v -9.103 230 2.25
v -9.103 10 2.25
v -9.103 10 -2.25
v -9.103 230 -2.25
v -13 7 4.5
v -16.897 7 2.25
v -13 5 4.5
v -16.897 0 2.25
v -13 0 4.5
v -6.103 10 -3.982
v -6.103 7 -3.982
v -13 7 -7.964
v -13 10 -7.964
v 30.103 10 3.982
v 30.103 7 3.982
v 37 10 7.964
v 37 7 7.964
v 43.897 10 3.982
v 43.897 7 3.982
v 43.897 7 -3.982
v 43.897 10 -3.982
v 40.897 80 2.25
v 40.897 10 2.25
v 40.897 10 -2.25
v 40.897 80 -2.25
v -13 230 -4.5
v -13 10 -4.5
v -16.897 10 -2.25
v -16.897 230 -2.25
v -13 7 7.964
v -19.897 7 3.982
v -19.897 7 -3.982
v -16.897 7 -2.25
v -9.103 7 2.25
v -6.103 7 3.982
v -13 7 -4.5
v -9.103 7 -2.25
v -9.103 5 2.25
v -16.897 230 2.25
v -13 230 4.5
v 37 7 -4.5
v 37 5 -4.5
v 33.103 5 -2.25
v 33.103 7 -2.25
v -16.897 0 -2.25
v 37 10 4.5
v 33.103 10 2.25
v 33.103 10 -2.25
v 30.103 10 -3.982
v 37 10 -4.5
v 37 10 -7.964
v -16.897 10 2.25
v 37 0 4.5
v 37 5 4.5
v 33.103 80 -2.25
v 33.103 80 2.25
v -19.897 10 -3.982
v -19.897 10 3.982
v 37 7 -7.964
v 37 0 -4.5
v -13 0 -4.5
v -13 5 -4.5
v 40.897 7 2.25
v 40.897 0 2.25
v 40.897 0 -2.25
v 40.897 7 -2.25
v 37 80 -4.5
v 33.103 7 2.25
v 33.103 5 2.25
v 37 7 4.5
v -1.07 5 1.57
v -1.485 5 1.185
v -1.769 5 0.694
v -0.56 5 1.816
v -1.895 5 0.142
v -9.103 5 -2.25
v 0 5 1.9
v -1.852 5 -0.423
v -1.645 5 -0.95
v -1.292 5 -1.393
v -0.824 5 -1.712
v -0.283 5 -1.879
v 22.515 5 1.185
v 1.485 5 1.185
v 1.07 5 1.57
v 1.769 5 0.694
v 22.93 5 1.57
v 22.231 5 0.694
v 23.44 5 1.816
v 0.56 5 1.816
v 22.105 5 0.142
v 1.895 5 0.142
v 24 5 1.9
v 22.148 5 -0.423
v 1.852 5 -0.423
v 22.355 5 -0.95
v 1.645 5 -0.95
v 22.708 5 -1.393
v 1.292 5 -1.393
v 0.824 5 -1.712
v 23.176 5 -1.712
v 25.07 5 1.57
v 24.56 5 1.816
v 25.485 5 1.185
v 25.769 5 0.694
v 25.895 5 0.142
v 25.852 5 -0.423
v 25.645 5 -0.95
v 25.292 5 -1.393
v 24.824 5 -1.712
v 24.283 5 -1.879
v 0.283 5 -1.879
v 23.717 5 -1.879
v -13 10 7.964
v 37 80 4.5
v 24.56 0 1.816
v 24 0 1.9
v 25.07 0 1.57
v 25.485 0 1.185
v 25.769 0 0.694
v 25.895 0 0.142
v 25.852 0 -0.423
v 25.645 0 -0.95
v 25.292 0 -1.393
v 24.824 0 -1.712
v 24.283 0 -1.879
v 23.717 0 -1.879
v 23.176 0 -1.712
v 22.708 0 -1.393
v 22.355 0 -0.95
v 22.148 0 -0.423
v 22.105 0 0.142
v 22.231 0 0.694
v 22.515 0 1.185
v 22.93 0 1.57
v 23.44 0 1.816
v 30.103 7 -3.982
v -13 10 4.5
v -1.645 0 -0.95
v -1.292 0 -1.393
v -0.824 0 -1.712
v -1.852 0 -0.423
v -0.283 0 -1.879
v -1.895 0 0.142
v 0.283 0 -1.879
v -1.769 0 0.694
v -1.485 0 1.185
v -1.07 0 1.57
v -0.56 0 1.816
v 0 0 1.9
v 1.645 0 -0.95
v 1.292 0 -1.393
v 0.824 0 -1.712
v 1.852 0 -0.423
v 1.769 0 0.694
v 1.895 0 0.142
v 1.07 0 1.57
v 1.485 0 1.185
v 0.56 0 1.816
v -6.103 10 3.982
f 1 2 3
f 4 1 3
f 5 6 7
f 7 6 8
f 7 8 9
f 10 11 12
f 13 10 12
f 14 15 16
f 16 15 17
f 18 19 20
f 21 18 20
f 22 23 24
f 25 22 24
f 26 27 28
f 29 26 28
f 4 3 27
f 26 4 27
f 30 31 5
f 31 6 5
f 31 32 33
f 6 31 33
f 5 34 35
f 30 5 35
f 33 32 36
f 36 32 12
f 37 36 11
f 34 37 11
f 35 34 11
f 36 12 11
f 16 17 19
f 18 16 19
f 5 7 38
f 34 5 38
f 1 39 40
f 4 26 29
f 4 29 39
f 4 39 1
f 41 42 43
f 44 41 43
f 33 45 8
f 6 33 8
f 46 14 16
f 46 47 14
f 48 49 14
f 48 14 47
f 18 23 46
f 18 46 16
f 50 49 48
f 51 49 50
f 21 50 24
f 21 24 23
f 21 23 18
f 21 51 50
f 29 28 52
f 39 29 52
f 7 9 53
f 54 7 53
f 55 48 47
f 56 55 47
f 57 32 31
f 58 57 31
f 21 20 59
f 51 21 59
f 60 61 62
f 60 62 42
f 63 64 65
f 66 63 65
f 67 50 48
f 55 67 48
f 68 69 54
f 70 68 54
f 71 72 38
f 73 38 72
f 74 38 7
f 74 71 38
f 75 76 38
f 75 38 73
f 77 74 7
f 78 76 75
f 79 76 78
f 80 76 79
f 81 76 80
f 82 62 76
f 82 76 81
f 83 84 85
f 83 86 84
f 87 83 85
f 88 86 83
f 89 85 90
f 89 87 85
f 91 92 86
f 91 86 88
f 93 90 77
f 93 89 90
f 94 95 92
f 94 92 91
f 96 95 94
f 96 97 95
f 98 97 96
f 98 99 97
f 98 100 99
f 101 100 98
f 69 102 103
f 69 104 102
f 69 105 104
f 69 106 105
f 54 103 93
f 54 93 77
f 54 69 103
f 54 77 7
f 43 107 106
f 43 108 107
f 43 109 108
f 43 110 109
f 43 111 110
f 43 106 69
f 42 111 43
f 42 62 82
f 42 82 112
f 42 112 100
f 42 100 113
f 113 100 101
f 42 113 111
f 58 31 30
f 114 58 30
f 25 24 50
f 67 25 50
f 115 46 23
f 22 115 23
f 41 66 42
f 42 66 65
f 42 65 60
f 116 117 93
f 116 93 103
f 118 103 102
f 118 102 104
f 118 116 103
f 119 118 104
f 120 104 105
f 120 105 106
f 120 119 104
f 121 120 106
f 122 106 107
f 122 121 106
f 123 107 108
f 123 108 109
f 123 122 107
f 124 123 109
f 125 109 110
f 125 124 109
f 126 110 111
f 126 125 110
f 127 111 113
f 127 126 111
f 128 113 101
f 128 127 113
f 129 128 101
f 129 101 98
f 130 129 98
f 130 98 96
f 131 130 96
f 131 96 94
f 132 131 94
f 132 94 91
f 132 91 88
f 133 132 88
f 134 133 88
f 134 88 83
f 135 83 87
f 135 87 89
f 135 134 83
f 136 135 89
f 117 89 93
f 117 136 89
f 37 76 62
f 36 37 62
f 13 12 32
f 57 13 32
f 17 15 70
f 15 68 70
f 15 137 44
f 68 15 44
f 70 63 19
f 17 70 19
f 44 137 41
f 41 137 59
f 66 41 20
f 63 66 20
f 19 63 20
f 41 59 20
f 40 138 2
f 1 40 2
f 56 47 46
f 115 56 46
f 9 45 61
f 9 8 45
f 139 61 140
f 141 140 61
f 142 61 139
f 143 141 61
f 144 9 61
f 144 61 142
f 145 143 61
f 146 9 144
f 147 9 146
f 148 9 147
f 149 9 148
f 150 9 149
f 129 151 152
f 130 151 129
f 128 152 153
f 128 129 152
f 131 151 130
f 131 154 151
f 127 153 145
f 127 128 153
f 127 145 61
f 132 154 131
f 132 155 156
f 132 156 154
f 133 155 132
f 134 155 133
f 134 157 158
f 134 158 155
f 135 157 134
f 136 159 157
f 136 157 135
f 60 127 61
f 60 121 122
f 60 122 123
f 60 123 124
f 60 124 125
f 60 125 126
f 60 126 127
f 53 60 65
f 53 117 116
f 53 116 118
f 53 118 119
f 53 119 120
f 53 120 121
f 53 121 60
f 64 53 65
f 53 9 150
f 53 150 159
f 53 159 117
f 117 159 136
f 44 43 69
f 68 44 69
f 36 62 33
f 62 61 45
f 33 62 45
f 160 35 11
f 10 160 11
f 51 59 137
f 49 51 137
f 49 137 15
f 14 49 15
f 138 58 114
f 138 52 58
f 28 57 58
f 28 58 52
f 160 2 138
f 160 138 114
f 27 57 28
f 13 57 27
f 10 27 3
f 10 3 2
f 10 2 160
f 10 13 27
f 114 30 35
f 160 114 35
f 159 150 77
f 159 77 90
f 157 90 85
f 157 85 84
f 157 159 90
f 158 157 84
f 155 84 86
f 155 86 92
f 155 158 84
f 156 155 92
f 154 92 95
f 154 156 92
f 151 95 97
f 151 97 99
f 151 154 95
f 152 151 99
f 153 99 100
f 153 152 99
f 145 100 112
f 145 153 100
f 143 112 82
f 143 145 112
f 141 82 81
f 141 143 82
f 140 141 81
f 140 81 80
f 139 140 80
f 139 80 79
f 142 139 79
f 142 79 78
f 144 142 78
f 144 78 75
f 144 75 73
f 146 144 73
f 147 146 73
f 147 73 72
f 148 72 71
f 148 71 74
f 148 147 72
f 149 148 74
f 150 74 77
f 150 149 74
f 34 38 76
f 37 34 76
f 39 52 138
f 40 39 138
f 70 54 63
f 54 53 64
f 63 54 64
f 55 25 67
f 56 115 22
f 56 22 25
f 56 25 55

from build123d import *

# Parameters (mm, degrees)
SKETCH1_W           = 50
SKETCH1_H           = 9
SKETCH1_R           = 1.9
BOSS_EXTRUDE1_DEPTH = 5
BOSS_EXTRUDE2_DEPTH = 80
BOSS_EXTRUDE3_DEPTH = 150
BOSS_EXTRUDE4_DEPTH = 3


with BuildPart() as part:
    # Sketch1 → Boss-Extrude1 (new body)
    with BuildSketch(Plane(origin=(0, 0, 0), x_dir=(1, 0, 0), z_dir=(0, 1, 0))):
        with Locations((12, 0)):
            Rectangle(SKETCH1_W, SKETCH1_H)
        with Locations(Location((24, 0, 0), (0, 0, 270))):
            Circle(SKETCH1_R, mode=Mode.SUBTRACT)
        with Locations(Location((0, 0, 0), (0, 0, 270))):
            Circle(SKETCH1_R, mode=Mode.SUBTRACT)
    extrude(amount=BOSS_EXTRUDE1_DEPTH)

    # Sketch3 → Boss-Extrude2 (add)
    with BuildSketch(Plane.XZ):
        Polygon((-13, 4.5), (-16.897114317, 2.25), (-16.897114317, -2.25), (-13, -4.5), (-9.102885683, -2.25), (-9.102885683, 2.25), align=None)
        Polygon((33.102885683, 2.25), (37, 4.5), (40.897114317, 2.25), (40.897114317, -2.25), (37, -4.5), (33.102885683, -2.25), align=None)
    extrude(amount=-BOSS_EXTRUDE2_DEPTH)

    # Sketch4 → Boss-Extrude3 (add)
    with BuildSketch(Plane(origin=(0, 80, 0), x_dir=(1, 0, 0), z_dir=(0, 1, 0))):
        Polygon((-13, -4.5), (-9.102885683, -2.25), (-9.102885683, 2.25), (-13, 4.5), (-16.897114317, 2.25), (-16.897114317, -2.25), align=None)
    extrude(amount=BOSS_EXTRUDE3_DEPTH)

    # Sketch5 → Boss-Extrude4 (add)
    # profile 1 of 2: a face of its own
    with BuildSketch(Plane(origin=(0, 7, 0), x_dir=(-1, 0, 0), z_dir=(0, -1, 0))):
        Polygon((19.897114317, 3.982050808), (19.897114317, -3.982050808), (13, -7.964101615), (6.102885683, -3.982050808), (6.102885683, 3.982050808), (13, 7.964101615), align=None)
        Polygon((16.897114317, -2.25), (13, -4.5), (9.102885683, -2.25), (9.102885683, 2.25), (13, 4.5), (16.897114317, 2.25), align=None, mode=Mode.SUBTRACT)
    # profile 2 of 2: a face of its own
    with BuildSketch(Plane(origin=(0, 7, 0), x_dir=(-1, 0, 0), z_dir=(0, -1, 0))):
        Polygon((-43.897114317, -3.982050808), (-43.897114317, 3.982050808), (-37, 7.964101615), (-30.102885683, 3.982050808), (-30.102885683, -3.982050808), (-37, -7.964101615), align=None)
        Polygon((-33.102885683, 2.25), (-33.102885683, -2.25), (-37, -4.5), (-40.897114317, -2.25), (-40.897114317, 2.25), (-37, 4.5), align=None, mode=Mode.SUBTRACT)
    extrude(amount=-BOSS_EXTRUDE4_DEPTH)


solid = part.part
